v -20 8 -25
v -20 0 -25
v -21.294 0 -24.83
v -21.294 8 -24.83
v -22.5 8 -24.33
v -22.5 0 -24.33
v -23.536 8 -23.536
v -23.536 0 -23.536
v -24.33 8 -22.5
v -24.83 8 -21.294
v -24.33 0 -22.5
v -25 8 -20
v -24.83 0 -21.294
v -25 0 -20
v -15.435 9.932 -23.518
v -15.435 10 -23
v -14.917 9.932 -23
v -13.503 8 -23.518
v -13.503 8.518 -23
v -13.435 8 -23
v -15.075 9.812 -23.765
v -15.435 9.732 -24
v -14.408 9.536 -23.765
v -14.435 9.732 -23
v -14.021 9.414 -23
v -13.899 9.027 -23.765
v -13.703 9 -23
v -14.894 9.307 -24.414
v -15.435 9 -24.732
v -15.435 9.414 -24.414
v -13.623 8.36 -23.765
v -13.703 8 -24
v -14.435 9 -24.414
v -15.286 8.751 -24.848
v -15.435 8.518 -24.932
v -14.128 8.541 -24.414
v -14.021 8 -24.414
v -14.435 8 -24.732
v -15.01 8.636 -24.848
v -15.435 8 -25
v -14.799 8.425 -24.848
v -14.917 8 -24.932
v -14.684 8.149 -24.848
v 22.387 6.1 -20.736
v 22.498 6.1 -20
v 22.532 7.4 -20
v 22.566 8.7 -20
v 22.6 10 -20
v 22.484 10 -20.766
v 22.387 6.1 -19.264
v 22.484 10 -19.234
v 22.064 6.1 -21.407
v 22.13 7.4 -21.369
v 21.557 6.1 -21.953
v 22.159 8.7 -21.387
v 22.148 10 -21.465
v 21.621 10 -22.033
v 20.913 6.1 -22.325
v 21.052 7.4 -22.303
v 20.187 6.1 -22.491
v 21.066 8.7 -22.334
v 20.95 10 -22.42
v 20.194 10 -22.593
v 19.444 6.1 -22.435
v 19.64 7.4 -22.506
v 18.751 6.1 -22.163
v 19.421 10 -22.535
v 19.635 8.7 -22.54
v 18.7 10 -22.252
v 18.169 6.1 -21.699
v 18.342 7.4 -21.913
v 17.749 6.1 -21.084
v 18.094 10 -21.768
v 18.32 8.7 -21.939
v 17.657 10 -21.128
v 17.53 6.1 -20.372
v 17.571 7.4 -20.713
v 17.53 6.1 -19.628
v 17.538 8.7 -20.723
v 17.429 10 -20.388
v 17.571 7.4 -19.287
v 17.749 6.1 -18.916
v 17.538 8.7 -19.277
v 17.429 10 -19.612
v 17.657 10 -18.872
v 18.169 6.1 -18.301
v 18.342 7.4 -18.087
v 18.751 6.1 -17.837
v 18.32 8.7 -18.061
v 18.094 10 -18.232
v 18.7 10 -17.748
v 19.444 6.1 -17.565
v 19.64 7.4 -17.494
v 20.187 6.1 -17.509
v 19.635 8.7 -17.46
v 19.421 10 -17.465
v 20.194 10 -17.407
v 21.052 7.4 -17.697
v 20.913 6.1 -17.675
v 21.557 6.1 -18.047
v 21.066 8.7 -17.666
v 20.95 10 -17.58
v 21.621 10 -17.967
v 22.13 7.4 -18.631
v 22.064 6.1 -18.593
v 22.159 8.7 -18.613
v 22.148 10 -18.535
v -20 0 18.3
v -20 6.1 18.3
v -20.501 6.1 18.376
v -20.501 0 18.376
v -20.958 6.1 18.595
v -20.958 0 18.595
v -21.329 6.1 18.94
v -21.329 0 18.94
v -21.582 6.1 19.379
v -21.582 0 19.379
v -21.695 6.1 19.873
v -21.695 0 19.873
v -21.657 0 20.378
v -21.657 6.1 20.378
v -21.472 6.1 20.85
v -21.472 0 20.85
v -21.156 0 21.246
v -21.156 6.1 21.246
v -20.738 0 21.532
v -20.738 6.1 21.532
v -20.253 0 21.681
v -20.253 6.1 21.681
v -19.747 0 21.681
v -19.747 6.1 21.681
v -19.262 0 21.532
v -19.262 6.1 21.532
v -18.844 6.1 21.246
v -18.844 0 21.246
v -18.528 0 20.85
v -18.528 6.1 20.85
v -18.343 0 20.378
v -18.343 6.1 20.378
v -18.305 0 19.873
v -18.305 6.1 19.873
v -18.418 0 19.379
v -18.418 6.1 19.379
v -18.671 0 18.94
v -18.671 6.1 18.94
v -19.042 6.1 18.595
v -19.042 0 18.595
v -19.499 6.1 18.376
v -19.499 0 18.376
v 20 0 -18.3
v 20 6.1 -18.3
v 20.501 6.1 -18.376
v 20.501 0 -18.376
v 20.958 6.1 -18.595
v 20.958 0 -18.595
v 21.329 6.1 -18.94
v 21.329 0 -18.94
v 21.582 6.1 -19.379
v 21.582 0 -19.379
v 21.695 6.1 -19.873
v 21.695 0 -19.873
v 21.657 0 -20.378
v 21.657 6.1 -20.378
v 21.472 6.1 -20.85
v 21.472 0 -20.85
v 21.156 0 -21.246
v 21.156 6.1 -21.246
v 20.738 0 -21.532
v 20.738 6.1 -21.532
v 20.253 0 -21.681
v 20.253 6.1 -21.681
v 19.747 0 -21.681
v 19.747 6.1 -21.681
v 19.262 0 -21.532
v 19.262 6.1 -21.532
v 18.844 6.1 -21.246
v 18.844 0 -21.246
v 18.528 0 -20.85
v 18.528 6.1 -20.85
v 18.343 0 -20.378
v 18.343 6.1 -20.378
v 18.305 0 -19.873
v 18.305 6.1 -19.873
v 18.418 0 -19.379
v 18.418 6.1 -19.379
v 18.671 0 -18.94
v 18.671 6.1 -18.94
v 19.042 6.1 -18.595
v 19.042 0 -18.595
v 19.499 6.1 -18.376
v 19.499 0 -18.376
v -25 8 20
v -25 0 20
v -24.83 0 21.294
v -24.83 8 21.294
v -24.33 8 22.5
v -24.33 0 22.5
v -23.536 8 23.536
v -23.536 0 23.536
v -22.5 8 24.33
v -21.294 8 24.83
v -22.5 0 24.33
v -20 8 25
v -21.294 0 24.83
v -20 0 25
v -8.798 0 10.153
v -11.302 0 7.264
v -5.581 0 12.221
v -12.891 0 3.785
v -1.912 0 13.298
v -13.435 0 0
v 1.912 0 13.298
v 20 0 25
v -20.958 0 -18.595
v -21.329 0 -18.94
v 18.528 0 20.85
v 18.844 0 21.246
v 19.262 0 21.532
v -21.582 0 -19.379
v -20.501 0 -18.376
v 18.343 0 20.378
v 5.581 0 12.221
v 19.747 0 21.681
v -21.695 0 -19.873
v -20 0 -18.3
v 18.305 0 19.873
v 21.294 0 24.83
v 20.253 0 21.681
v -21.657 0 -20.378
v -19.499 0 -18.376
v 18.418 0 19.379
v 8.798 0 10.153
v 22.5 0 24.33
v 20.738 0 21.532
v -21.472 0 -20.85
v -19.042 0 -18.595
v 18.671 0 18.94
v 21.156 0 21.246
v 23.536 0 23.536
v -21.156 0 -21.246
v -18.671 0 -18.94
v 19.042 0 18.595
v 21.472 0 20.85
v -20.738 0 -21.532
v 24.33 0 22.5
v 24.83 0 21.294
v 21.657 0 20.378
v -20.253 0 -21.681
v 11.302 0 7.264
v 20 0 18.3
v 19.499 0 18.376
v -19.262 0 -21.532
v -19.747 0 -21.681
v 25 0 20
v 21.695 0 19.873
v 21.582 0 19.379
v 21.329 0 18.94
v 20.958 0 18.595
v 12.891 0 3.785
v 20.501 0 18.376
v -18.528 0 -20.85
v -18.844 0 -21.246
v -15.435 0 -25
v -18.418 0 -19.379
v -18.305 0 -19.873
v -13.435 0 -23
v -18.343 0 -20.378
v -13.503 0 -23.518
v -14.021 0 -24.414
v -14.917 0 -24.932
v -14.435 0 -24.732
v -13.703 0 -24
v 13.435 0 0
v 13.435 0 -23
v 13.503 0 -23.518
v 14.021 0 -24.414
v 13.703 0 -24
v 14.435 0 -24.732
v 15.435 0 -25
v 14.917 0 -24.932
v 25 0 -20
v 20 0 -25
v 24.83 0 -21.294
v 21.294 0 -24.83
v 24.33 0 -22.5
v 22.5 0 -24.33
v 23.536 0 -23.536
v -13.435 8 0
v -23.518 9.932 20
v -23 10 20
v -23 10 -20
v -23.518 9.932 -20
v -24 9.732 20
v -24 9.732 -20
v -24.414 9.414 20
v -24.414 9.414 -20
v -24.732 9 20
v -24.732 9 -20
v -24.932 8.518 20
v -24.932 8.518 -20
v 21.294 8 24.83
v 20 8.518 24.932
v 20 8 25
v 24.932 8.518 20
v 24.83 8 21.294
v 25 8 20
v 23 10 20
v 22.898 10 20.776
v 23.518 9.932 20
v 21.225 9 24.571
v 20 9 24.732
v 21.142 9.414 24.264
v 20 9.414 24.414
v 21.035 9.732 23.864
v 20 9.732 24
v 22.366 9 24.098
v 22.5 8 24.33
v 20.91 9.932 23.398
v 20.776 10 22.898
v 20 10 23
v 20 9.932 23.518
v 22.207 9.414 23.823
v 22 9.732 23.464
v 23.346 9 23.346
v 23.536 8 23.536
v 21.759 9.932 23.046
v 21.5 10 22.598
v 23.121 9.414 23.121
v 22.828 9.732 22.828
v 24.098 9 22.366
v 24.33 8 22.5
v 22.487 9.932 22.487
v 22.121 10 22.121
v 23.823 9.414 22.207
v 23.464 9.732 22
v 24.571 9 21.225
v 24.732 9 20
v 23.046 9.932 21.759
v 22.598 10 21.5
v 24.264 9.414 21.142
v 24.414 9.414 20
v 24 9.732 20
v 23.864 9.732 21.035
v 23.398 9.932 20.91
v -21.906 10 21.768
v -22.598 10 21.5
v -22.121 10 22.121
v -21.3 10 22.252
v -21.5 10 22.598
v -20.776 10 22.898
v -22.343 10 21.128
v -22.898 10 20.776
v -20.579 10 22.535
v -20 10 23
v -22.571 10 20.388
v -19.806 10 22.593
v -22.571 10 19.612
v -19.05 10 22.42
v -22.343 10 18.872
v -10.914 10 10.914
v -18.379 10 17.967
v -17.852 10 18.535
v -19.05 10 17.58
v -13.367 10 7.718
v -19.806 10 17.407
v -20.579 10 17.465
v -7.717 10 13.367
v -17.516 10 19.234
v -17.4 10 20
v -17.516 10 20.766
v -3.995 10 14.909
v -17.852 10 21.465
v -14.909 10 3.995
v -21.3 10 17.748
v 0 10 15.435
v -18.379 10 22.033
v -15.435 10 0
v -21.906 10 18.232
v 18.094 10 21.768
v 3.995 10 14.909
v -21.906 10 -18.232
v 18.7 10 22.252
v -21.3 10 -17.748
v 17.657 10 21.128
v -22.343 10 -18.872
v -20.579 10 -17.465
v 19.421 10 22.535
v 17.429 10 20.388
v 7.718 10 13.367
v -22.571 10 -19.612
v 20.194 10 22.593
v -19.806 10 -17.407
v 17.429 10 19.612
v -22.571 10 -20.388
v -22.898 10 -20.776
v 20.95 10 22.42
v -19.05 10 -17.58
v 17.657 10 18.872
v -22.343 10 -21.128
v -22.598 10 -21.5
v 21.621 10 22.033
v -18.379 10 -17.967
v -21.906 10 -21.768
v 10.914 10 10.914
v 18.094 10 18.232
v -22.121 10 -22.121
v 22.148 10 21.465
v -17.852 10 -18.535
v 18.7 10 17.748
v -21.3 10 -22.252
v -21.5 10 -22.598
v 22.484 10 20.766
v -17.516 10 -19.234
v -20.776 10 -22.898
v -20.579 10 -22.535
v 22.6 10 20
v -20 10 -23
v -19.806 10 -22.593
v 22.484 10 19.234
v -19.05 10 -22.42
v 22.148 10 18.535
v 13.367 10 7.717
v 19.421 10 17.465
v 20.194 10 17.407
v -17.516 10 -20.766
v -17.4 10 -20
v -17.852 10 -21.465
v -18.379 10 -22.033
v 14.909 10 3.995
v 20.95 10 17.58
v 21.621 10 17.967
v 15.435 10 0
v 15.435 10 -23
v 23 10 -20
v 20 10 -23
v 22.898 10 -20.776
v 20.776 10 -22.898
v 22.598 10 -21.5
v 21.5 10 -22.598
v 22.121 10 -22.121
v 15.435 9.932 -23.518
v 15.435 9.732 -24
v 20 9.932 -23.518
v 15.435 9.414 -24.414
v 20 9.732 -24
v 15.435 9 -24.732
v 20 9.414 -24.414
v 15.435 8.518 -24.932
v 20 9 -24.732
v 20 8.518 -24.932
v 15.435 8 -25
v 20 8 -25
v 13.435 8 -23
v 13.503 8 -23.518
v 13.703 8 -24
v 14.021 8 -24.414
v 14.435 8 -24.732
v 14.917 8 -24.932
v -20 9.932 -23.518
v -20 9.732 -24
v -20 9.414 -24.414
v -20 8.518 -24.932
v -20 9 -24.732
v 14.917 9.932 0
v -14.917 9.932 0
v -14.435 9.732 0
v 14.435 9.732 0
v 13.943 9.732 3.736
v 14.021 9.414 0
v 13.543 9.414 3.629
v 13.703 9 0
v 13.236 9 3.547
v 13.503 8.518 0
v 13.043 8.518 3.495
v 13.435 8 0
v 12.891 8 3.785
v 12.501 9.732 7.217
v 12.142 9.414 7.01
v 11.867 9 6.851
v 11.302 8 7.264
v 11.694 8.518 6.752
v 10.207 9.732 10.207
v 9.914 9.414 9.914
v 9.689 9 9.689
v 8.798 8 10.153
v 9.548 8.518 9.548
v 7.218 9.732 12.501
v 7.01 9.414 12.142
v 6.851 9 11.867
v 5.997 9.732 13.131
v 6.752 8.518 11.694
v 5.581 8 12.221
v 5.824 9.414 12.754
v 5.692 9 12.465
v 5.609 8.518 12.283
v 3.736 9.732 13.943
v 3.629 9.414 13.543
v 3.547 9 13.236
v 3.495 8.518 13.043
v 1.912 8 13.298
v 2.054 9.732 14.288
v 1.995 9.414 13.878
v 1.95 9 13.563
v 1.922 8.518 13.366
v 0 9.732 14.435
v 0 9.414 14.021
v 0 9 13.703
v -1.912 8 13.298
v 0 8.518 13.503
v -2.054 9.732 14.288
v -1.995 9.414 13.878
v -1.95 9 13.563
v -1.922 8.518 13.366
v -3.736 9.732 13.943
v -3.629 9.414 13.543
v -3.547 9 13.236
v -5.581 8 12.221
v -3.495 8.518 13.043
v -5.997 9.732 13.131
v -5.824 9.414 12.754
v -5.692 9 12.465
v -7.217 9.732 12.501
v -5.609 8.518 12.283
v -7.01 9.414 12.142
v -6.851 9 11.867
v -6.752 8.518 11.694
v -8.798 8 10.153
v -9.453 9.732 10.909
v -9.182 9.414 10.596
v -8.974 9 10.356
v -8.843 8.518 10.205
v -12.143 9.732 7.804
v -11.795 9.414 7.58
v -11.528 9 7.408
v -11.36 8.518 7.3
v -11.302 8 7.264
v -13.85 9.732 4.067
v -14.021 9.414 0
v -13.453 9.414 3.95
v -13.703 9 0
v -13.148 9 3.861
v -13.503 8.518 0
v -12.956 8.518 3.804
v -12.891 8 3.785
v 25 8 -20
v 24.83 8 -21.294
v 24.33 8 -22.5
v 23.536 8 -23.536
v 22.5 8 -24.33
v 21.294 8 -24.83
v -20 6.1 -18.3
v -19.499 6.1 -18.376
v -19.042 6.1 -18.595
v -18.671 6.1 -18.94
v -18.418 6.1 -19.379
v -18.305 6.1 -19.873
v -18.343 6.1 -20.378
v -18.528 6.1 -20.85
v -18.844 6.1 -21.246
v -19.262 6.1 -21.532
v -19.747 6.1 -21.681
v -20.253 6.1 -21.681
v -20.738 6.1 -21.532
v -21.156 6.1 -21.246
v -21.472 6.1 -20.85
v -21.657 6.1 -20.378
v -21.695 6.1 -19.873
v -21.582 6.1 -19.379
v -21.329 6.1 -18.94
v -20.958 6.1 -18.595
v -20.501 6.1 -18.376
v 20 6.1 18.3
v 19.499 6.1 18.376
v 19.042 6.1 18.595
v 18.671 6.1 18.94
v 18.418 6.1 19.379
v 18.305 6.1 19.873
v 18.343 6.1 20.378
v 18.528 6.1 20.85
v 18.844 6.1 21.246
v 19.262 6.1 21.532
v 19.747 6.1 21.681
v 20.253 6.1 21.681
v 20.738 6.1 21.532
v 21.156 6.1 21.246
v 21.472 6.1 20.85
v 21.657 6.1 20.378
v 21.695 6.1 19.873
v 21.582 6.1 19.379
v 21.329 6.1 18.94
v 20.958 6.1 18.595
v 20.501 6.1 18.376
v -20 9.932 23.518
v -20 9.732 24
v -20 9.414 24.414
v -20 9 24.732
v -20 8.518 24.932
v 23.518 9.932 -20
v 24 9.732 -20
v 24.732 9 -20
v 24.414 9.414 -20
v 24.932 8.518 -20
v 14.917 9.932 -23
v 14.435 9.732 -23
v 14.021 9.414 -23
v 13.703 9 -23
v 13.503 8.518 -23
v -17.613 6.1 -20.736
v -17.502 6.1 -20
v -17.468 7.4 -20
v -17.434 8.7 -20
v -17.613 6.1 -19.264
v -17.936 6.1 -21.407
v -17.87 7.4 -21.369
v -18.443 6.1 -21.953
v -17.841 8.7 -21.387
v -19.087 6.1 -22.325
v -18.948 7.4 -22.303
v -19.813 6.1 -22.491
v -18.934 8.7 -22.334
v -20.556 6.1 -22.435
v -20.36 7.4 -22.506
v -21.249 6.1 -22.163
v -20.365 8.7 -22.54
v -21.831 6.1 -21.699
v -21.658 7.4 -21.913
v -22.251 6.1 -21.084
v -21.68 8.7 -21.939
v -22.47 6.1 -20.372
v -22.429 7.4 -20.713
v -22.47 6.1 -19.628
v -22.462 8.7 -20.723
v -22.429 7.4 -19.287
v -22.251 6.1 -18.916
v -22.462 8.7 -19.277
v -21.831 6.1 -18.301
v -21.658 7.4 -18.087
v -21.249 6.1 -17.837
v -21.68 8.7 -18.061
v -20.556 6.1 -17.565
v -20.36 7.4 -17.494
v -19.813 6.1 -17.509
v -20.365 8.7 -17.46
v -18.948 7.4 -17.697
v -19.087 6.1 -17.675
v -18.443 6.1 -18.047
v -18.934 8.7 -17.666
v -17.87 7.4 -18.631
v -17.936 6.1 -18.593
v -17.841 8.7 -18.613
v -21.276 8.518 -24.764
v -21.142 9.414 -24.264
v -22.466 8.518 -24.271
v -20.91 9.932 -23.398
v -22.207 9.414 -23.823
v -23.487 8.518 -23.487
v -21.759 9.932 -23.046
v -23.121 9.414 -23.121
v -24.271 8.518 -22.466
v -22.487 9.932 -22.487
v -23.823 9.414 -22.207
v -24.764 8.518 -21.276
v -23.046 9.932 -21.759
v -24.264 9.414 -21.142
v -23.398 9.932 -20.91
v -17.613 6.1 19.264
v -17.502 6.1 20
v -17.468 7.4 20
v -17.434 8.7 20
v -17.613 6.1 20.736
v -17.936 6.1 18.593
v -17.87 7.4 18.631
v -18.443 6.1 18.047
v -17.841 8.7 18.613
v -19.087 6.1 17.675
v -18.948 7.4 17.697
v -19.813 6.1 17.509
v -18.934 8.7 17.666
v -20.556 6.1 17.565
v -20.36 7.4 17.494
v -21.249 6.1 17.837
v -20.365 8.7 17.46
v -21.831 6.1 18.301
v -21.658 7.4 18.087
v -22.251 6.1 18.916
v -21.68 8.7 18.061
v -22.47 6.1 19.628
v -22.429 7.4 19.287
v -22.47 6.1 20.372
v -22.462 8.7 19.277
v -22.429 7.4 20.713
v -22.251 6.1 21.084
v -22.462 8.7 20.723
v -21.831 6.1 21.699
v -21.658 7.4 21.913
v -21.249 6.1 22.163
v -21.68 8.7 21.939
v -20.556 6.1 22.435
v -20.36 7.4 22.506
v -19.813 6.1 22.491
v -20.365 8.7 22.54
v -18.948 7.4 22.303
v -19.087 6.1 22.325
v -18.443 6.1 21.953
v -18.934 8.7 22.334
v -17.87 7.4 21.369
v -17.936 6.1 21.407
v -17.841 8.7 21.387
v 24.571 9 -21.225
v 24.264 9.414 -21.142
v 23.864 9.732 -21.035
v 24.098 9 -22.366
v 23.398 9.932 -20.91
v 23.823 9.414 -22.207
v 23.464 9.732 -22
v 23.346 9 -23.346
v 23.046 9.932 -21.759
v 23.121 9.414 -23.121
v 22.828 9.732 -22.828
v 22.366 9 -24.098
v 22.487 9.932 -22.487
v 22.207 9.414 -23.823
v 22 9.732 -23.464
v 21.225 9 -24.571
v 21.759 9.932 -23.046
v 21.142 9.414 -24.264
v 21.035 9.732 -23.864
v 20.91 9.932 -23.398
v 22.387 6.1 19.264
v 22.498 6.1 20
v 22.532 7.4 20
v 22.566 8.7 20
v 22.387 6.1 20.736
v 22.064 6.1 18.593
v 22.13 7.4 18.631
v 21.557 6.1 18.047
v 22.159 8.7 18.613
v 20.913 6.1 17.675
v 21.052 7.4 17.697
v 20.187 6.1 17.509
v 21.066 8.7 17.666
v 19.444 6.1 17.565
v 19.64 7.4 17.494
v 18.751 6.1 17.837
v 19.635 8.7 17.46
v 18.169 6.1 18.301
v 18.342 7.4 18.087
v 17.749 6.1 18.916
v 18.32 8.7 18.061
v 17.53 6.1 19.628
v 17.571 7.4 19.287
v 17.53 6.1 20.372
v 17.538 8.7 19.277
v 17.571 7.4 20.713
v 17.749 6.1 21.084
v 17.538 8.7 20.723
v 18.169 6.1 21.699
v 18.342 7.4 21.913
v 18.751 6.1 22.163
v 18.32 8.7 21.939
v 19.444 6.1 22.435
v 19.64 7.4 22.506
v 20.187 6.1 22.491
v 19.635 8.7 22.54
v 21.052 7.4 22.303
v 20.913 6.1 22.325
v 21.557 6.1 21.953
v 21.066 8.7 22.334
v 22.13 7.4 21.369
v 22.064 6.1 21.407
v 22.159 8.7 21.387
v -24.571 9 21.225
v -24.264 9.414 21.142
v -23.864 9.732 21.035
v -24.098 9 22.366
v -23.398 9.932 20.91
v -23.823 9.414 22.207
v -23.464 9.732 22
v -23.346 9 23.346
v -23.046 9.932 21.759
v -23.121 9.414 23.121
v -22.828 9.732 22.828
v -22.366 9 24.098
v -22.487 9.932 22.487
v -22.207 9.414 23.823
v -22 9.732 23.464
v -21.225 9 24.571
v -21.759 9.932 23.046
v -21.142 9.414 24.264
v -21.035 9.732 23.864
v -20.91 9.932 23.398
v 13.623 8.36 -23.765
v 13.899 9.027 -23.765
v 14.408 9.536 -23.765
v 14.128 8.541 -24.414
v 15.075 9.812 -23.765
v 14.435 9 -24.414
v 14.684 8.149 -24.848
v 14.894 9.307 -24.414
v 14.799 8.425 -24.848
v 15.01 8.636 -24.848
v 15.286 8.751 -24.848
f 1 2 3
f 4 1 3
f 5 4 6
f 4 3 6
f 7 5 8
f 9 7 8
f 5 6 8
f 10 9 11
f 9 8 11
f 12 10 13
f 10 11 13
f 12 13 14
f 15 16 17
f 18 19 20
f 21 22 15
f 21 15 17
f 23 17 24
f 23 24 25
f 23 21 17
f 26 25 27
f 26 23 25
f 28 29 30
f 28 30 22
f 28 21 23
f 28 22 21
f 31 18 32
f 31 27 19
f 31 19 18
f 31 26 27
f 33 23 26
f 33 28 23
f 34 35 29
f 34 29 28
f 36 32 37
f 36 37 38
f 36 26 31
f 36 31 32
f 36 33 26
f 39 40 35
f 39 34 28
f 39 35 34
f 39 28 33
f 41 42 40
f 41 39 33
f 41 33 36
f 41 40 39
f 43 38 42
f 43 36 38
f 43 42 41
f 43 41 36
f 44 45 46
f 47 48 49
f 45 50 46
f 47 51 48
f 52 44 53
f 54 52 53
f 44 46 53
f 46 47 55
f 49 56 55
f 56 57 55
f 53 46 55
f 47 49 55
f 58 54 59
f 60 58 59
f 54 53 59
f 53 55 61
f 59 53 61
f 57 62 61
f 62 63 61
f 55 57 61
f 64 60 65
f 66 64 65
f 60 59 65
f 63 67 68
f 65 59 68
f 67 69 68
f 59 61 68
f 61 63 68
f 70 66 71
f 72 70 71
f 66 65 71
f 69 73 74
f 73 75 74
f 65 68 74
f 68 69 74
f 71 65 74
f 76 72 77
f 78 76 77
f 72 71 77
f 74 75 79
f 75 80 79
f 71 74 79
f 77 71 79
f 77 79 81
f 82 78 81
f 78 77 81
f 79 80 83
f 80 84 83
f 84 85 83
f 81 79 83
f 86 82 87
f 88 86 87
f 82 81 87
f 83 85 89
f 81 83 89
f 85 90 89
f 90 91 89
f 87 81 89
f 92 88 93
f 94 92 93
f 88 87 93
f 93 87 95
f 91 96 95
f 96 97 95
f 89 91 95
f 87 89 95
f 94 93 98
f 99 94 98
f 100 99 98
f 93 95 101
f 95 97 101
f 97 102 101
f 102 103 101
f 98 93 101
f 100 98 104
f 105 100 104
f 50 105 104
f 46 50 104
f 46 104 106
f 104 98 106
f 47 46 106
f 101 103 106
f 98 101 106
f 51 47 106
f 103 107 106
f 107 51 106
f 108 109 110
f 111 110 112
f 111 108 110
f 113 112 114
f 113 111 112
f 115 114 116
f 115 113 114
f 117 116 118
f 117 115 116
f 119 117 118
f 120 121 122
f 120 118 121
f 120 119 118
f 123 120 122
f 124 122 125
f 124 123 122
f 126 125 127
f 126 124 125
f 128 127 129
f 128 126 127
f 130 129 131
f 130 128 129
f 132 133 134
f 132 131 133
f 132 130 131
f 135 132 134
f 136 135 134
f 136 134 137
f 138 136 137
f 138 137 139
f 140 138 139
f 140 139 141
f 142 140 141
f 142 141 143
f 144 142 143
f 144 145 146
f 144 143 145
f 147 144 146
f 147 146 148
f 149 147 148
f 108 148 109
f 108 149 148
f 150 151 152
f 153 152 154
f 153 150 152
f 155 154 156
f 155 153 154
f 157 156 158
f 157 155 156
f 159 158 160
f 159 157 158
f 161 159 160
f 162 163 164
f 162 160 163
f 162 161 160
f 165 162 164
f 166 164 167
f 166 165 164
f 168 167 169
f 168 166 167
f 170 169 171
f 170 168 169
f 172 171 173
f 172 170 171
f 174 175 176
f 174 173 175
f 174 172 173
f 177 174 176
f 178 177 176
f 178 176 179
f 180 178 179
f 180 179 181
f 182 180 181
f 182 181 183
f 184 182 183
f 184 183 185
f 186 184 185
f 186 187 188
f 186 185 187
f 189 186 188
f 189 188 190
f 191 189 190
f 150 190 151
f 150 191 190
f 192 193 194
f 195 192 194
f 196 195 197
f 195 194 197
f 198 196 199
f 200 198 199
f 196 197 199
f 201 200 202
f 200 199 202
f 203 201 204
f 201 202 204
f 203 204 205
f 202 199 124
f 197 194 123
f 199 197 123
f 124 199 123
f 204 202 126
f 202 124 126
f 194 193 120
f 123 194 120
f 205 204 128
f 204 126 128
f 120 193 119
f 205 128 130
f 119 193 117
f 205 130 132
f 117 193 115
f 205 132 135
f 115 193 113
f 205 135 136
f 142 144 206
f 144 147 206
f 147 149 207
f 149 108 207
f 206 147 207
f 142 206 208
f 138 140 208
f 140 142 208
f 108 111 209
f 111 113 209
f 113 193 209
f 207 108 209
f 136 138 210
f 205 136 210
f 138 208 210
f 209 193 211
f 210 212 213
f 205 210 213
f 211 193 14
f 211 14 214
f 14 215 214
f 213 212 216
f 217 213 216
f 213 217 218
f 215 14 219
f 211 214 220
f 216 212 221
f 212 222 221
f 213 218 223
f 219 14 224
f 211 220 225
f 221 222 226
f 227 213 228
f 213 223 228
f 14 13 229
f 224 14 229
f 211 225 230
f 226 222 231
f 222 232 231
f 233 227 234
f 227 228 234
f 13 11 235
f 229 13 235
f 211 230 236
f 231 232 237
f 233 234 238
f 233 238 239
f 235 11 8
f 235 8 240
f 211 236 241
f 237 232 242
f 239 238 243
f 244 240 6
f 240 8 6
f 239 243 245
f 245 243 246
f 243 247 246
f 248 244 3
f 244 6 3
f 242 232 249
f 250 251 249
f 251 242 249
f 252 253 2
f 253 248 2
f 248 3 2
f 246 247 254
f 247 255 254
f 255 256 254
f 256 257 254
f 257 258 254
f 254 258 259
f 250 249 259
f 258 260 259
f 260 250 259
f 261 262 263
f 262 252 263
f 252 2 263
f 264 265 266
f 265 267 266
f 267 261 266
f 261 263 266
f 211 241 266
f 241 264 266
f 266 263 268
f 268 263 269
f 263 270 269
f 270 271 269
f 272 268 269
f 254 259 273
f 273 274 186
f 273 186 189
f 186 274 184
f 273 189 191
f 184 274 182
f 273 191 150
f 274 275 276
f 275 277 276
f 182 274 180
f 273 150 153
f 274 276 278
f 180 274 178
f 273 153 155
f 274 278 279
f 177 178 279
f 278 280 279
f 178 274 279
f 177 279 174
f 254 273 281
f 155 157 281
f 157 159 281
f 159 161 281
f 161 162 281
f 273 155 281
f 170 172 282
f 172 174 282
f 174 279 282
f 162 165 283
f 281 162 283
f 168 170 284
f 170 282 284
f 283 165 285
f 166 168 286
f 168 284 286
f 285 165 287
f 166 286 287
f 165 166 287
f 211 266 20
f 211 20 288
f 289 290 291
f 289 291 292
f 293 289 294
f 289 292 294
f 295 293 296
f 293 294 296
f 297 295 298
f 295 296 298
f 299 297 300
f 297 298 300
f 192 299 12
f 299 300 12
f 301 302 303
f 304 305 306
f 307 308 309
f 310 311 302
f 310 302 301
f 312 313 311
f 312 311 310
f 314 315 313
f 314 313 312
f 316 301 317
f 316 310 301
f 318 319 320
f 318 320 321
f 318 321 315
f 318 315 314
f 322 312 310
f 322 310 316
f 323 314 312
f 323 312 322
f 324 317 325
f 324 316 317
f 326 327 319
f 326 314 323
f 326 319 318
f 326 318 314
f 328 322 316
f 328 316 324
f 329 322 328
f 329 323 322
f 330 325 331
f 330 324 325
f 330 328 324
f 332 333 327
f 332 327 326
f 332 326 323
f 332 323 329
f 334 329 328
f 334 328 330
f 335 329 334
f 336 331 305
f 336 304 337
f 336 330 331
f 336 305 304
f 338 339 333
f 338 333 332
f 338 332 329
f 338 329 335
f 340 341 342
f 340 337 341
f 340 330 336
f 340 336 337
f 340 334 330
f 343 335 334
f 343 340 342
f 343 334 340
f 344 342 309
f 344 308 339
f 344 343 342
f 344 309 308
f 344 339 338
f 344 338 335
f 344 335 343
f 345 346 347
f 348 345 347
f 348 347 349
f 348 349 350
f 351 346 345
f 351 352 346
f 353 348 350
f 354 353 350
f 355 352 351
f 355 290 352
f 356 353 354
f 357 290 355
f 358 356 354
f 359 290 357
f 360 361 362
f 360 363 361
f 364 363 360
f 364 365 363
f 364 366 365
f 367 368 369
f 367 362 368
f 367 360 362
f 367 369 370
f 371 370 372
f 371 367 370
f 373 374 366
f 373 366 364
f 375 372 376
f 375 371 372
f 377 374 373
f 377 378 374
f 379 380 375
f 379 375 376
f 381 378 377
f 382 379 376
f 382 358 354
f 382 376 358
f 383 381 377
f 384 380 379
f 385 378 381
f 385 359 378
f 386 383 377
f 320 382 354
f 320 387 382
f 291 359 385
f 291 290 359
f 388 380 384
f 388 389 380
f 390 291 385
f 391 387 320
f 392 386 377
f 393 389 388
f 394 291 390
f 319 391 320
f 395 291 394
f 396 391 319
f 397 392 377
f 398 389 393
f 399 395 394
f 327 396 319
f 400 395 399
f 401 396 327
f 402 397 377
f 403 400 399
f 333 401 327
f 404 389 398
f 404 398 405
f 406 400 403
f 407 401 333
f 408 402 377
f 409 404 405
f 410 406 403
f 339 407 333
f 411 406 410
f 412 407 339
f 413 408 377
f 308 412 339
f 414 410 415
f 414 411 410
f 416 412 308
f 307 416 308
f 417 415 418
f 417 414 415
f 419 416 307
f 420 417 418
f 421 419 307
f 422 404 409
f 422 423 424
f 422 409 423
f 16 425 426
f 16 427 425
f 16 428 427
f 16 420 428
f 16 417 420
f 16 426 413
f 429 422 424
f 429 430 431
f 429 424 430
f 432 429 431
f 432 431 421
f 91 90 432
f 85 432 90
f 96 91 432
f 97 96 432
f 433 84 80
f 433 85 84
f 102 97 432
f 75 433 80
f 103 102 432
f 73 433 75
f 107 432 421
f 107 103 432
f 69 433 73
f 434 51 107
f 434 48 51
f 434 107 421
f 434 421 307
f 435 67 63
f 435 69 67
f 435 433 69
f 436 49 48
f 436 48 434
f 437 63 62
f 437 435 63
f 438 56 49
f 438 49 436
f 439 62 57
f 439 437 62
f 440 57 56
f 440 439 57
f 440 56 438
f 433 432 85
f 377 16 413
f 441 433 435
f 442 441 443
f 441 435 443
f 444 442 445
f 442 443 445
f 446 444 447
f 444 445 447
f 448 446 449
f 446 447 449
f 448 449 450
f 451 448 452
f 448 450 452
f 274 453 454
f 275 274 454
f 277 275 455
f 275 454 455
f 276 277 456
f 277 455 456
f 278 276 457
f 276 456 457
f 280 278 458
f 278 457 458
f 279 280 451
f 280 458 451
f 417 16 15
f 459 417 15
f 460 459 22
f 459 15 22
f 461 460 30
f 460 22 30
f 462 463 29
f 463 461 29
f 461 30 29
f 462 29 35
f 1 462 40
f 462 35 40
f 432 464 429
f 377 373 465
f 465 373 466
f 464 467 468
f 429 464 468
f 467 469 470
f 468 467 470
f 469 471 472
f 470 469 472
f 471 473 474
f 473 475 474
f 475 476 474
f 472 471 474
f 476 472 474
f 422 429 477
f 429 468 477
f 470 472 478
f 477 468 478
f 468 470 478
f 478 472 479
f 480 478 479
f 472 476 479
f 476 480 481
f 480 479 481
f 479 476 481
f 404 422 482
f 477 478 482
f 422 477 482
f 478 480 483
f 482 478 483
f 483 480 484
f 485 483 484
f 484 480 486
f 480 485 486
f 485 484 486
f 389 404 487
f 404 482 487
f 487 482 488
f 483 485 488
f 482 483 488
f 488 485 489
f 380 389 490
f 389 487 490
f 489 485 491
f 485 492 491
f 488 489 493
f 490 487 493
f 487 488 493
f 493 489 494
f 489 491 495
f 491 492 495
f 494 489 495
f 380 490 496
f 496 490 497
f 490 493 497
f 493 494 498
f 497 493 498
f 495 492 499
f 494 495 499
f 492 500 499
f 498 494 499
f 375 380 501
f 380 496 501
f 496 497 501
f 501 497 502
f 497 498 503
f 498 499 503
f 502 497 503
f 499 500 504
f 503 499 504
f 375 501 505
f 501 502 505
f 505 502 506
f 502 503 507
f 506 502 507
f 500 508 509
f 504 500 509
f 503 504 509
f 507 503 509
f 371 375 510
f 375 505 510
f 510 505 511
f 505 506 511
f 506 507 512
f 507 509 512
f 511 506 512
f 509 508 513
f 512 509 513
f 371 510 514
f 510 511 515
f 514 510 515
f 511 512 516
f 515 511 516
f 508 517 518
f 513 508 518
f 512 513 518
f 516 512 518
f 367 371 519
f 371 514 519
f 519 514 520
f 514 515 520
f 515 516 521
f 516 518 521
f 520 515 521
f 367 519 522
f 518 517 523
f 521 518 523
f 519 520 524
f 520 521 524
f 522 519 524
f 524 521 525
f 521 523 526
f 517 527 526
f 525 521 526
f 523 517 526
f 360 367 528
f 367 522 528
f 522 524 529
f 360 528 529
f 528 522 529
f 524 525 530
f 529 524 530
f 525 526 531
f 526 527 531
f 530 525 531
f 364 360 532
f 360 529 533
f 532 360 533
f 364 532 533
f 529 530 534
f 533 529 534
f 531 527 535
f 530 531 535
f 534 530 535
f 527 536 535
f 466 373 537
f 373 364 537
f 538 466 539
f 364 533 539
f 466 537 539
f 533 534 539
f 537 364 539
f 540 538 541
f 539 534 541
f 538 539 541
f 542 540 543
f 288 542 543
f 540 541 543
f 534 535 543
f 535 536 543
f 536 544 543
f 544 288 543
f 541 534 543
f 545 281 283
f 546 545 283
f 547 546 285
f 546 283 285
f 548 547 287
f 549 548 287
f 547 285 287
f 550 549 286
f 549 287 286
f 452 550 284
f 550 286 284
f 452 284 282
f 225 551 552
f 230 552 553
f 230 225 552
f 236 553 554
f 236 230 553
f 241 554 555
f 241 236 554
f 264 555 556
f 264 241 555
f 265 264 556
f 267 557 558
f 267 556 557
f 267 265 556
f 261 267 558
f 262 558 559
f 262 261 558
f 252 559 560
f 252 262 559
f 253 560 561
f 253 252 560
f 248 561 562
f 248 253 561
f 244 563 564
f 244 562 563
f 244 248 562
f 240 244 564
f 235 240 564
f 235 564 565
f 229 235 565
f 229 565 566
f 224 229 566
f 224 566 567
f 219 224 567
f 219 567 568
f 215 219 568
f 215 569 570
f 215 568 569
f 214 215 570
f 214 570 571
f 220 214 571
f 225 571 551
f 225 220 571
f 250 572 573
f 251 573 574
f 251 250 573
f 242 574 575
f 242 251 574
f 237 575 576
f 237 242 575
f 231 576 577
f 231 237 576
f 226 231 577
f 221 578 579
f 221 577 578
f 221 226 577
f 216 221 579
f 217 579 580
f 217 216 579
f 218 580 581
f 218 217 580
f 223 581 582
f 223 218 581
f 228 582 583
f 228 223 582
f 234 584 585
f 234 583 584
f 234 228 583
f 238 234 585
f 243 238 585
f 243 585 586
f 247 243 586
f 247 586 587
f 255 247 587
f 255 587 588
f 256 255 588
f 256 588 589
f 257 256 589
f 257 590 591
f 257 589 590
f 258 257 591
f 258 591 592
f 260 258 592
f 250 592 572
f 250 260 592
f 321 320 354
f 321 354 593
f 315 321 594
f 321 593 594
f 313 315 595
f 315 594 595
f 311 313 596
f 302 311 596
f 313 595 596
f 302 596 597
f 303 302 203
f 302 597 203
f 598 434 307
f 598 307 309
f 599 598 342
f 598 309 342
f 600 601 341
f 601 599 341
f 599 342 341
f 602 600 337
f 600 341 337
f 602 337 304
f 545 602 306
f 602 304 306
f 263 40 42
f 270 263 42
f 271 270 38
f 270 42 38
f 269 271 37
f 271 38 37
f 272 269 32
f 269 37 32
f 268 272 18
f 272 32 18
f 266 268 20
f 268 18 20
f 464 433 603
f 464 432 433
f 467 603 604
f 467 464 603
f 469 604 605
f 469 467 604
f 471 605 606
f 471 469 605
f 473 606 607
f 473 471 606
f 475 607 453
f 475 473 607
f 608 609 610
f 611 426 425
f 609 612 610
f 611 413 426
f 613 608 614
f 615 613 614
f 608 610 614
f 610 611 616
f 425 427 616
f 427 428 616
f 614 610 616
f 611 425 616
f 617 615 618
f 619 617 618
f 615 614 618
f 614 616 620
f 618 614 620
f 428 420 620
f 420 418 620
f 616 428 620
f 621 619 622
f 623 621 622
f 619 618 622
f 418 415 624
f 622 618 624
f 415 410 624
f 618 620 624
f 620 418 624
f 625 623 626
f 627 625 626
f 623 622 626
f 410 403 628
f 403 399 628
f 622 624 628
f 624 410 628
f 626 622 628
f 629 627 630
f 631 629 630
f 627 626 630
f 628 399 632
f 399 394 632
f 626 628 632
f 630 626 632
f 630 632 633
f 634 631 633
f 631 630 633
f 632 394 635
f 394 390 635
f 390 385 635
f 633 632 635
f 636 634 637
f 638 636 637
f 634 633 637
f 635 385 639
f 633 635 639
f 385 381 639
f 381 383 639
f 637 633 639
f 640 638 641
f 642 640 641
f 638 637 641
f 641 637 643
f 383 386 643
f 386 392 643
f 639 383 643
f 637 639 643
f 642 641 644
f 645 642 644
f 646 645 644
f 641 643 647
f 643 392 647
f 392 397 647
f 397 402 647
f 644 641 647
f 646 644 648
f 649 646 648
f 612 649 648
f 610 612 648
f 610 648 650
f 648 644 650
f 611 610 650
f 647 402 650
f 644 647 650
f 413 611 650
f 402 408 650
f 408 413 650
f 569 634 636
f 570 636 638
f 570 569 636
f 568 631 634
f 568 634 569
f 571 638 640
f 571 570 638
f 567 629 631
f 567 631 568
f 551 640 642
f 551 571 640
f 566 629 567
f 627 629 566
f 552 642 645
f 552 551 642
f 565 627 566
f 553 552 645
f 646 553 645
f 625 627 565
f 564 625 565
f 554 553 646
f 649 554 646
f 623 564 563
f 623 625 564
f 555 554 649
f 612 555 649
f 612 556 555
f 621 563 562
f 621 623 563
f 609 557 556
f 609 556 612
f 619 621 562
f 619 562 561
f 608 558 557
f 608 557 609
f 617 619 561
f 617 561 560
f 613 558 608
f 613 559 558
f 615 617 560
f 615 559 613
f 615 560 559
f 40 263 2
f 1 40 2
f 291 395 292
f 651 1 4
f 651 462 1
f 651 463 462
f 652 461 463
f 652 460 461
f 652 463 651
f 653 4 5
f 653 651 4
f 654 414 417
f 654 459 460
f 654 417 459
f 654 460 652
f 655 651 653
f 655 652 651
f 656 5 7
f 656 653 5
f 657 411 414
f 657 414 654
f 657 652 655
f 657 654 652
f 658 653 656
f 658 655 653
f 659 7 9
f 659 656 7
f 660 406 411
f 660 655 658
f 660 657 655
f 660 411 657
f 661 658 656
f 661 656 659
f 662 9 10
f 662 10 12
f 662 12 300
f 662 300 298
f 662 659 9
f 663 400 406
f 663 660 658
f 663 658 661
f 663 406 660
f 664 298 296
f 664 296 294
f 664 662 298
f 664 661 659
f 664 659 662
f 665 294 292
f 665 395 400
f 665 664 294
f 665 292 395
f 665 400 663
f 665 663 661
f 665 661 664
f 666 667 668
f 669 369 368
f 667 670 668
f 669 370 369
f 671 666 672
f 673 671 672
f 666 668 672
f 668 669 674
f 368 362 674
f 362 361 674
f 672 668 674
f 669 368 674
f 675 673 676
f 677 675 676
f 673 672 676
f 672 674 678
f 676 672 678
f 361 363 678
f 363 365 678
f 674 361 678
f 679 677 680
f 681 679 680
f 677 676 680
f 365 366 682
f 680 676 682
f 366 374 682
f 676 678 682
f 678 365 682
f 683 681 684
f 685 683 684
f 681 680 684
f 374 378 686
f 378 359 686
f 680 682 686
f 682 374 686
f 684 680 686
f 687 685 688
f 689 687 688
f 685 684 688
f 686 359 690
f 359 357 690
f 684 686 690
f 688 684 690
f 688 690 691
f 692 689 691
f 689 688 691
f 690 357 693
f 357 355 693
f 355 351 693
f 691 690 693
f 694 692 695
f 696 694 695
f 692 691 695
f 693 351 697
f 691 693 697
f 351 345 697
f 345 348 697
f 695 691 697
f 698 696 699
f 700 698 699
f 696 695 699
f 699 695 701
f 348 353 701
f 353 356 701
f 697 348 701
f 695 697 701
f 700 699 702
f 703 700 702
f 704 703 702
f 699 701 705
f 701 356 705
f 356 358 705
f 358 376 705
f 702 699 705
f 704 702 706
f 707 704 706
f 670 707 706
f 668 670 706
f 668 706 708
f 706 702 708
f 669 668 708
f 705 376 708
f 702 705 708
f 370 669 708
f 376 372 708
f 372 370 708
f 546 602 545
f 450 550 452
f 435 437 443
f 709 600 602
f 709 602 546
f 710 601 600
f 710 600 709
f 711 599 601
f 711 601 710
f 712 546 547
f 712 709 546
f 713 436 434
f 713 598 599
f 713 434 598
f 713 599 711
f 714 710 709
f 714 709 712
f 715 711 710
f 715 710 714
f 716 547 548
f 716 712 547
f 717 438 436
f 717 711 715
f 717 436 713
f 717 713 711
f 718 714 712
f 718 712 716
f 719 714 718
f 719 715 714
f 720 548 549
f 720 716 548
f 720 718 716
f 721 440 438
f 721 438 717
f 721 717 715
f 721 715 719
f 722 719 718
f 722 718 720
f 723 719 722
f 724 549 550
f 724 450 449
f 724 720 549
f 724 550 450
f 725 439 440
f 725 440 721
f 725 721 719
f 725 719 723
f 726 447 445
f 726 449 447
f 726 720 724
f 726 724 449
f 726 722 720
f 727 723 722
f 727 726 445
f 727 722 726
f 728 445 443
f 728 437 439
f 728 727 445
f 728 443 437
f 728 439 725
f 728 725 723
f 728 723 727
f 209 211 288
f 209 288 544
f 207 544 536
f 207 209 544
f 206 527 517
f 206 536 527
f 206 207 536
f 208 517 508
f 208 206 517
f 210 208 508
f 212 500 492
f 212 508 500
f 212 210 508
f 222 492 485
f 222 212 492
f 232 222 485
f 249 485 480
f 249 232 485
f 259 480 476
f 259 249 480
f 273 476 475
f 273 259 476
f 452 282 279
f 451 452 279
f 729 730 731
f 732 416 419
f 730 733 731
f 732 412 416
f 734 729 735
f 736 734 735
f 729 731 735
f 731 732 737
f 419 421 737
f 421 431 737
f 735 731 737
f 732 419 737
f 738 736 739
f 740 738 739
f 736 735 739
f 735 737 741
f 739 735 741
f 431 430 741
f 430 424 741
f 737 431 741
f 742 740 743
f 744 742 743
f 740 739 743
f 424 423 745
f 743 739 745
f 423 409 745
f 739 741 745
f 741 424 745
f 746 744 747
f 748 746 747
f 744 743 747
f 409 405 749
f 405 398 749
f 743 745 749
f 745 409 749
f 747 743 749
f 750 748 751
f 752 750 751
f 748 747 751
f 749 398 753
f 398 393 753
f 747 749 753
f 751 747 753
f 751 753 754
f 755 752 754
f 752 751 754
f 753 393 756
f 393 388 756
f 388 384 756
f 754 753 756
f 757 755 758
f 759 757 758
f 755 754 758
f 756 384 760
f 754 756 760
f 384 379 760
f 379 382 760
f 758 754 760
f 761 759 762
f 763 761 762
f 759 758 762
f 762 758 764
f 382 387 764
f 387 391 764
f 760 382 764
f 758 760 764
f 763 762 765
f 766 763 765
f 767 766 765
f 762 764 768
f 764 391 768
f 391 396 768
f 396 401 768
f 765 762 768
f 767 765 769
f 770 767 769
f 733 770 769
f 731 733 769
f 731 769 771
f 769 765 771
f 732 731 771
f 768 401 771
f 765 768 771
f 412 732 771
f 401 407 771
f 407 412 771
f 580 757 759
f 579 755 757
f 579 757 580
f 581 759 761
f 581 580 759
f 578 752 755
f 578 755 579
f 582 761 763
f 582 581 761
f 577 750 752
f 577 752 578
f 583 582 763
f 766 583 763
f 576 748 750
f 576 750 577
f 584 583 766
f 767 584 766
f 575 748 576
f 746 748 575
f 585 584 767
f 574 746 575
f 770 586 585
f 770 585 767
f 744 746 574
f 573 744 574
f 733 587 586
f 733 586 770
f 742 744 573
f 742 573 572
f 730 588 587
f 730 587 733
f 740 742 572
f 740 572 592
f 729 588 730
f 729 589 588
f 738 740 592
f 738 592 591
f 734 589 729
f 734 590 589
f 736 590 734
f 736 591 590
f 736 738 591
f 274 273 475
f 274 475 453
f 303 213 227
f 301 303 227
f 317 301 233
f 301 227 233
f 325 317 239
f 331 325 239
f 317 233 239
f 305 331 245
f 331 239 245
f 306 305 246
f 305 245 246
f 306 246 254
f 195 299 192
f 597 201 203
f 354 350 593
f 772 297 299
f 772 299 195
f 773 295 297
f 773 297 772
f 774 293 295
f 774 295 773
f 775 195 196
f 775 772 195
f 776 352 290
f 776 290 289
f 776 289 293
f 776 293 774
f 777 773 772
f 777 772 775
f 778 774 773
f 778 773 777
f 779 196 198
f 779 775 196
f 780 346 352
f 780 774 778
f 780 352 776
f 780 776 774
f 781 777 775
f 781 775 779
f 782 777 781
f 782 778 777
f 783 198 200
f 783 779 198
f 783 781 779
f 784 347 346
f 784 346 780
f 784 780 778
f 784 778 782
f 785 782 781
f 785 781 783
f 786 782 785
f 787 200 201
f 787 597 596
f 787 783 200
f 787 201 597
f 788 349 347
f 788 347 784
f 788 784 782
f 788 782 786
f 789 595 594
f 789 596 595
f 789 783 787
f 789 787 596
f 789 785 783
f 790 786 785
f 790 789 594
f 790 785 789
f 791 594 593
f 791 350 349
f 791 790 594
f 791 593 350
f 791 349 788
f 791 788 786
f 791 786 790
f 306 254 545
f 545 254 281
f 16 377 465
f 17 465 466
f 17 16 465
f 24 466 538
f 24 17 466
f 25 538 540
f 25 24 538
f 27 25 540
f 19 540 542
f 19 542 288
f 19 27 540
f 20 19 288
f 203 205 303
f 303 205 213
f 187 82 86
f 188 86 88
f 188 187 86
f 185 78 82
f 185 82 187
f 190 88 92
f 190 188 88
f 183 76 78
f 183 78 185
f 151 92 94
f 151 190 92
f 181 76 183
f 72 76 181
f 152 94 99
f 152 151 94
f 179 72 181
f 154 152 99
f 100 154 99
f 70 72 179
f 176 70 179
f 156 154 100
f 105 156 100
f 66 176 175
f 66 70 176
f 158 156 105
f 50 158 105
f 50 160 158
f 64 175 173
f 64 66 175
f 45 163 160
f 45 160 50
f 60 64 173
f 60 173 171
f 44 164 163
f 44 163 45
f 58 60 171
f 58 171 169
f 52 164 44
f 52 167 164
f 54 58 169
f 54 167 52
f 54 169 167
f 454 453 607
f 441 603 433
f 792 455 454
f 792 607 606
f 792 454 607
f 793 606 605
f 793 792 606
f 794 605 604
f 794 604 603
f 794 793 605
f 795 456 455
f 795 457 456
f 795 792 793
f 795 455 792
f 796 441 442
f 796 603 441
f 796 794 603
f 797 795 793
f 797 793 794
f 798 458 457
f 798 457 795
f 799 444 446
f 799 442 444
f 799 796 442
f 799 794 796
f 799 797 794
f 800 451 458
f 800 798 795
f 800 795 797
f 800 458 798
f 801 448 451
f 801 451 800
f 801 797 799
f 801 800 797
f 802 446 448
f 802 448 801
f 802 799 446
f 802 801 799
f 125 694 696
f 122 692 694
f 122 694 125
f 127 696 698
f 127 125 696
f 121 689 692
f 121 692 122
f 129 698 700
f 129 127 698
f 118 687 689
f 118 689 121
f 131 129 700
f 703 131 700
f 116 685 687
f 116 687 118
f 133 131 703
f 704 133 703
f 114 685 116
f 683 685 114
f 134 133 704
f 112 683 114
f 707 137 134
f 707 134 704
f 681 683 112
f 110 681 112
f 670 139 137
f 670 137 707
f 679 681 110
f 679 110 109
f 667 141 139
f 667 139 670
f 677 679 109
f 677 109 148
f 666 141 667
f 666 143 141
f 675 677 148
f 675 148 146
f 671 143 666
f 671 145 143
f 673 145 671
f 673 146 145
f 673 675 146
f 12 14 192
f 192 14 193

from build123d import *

# Parameters (mm, degrees)
BOSS_EXTRUDE1_DEPTH          = 10
SKETCH1_4_R                  = 1.7
CUT_EXTRUDE1_DEPTH           = 37.742346142
CUT_EXTRUDE2_START           = 10
SKETCH1_5_R                  = 2.6
CUT_EXTRUDE2_DEPTH           = 3.9
CUT_EXTRUDE2_DRAFT           = -1.5
CUT_EXTRUDE2_PROFILE_2_DEPTH = 3.9
CUT_EXTRUDE2_PROFILE_2_DRAFT = -1.5
CUT_EXTRUDE2_PROFILE_3_DEPTH = 3.9
CUT_EXTRUDE2_PROFILE_3_DRAFT = -1.5
CUT_EXTRUDE2_PROFILE_4_DEPTH = 3.9
CUT_EXTRUDE2_PROFILE_4_DRAFT = -1.5
FILLET1_R                    = 2
FILLET2_R                    = 2


with BuildPart() as part:
    # Sketch1 → Boss-Extrude1 (new body)
    with BuildSketch(Plane(origin=(0, 0, 0), x_dir=(1, 0, 0), z_dir=(0, 1, 0))):
        with BuildLine():
            Line((-20, -25), (20, -25))
            ThreePointArc((20, -25), (23.535533906, -23.535533906), (25, -20))
            Line((25, -20), (25, 20))
            ThreePointArc((25, 20), (23.535533906, 23.535533906), (20, 25))
            Line((20, 25), (-20, 25))
            ThreePointArc((-20, 25), (-23.535533906, 23.535533906), (-25, 20))
            Line((-25, 20), (-25, -20))
            ThreePointArc((-25, -20), (-23.535533906, -23.535533906), (-20, -25))
        make_face()
    extrude(amount=BOSS_EXTRUDE1_DEPTH)

    # Sketch1<4> → Cut-Extrude1 (cut, through all)
    with BuildSketch(Plane(origin=(0, 0, 0), x_dir=(1, 0, 0), z_dir=(0, 1, 0))):
        with BuildLine():
            Line((13.435, 25), (-13.435, 25))
            Line((-13.435, 25), (-13.435, 0))
            ThreePointArc((-13.435, 0), (0, -13.435), (13.435, 0))
            Line((13.435, 0), (13.435, 25))
        make_face()
        with Locations(Location((-20, 20, 0), (0, 0, 270))):
            Circle(SKETCH1_4_R)
        with Locations(Location((-20, -20, 0), (0, 0, 90))):
            Circle(SKETCH1_4_R)
        with Locations(Location((20, -20, 0), (0, 0, 90))):
            Circle(SKETCH1_4_R)
        with Locations(Location((20, 20, 0), (0, 0, 270))):
            Circle(SKETCH1_4_R)
    extrude(amount=CUT_EXTRUDE1_DEPTH, mode=Mode.SUBTRACT)


with BuildPart() as cut_extrude2_tool:
    # Sketch1<5> → Cut-Extrude2 (with draft: the straight prism first)
    with BuildSketch(Plane(origin=(0, 0, 0), x_dir=(1, 0, 0), z_dir=(0, 1, 0)).offset(CUT_EXTRUDE2_START)):
        with Locations((-20, 20)):
            Circle(SKETCH1_5_R)
    extrude(amount=-CUT_EXTRUDE2_DEPTH)
    # Cut-Extrude2: the draft: its side faces are tilted about the plane it starts from
    cut_extrude2_sides = [cut_extrude2_tool.faces().sort_by_distance(p)[0] for p in [
        (-22.6, 8.05, -20),
    ]]
    draft(cut_extrude2_sides, Plane(origin=(0, 0, 0), x_dir=(1, 0, 0), z_dir=(0, 1, 0)).offset(CUT_EXTRUDE2_START), CUT_EXTRUDE2_DRAFT)


with BuildPart() as part_1:
    add(part.part)

    # Cut-Extrude2: cut by cut_extrude2_tool
    add(cut_extrude2_tool.part, mode=Mode.SUBTRACT)


with BuildPart() as cut_extrude2_profile_2_tool:
    # Sketch1<5> → Cut-Extrude2 profile 2 (with draft: the straight prism first)
    with BuildSketch(Plane(origin=(0, 0, 0), x_dir=(1, 0, 0), z_dir=(0, 1, 0)).offset(CUT_EXTRUDE2_START)):
        with Locations((20, 20)):
            Circle(SKETCH1_5_R)
    extrude(amount=-CUT_EXTRUDE2_PROFILE_2_DEPTH)
    # Cut-Extrude2 profile 2: the draft: its side faces are tilted about the plane it starts from
    cut_extrude2_profile_2_sides = [cut_extrude2_profile_2_tool.faces().sort_by_distance(p)[0] for p in [
        (17.4, 8.05, -20),
    ]]
    draft(cut_extrude2_profile_2_sides, Plane(origin=(0, 0, 0), x_dir=(1, 0, 0), z_dir=(0, 1, 0)).offset(CUT_EXTRUDE2_START), CUT_EXTRUDE2_PROFILE_2_DRAFT)


with BuildPart() as part_2:
    add(part_1.part)

    # Cut-Extrude2 profile 2: cut by cut_extrude2_profile_2_tool
    add(cut_extrude2_profile_2_tool.part, mode=Mode.SUBTRACT)


with BuildPart() as cut_extrude2_profile_3_tool:
    # Sketch1<5> → Cut-Extrude2 profile 3 (with draft: the straight prism first)
    with BuildSketch(Plane(origin=(0, 0, 0), x_dir=(1, 0, 0), z_dir=(0, 1, 0)).offset(CUT_EXTRUDE2_START)):
        with Locations((-20, -20)):
            Circle(SKETCH1_5_R)
    extrude(amount=-CUT_EXTRUDE2_PROFILE_3_DEPTH)
    # Cut-Extrude2 profile 3: the draft: its side faces are tilted about the plane it starts from
    cut_extrude2_profile_3_sides = [cut_extrude2_profile_3_tool.faces().sort_by_distance(p)[0] for p in [
        (-22.6, 8.05, 20),
    ]]
    draft(cut_extrude2_profile_3_sides, Plane(origin=(0, 0, 0), x_dir=(1, 0, 0), z_dir=(0, 1, 0)).offset(CUT_EXTRUDE2_START), CUT_EXTRUDE2_PROFILE_3_DRAFT)


with BuildPart() as part_3:
    add(part_2.part)

    # Cut-Extrude2 profile 3: cut by cut_extrude2_profile_3_tool
    add(cut_extrude2_profile_3_tool.part, mode=Mode.SUBTRACT)


with BuildPart() as cut_extrude2_profile_4_tool:
    # Sketch1<5> → Cut-Extrude2 profile 4 (with draft: the straight prism first)
    with BuildSketch(Plane(origin=(0, 0, 0), x_dir=(1, 0, 0), z_dir=(0, 1, 0)).offset(CUT_EXTRUDE2_START)):
        with Locations((20, -20)):
            Circle(SKETCH1_5_R)
    extrude(amount=-CUT_EXTRUDE2_PROFILE_4_DEPTH)
    # Cut-Extrude2 profile 4: the draft: its side faces are tilted about the plane it starts from
    cut_extrude2_profile_4_sides = [cut_extrude2_profile_4_tool.faces().sort_by_distance(p)[0] for p in [
        (17.4, 8.05, 20),
    ]]
    draft(cut_extrude2_profile_4_sides, Plane(origin=(0, 0, 0), x_dir=(1, 0, 0), z_dir=(0, 1, 0)).offset(CUT_EXTRUDE2_START), CUT_EXTRUDE2_PROFILE_4_DRAFT)


with BuildPart() as part_4:
    add(part_3.part)

    # Cut-Extrude2 profile 4: cut by cut_extrude2_profile_4_tool
    add(cut_extrude2_profile_4_tool.part, mode=Mode.SUBTRACT)

    # Fillet1
    fillet1_edges = [part_4.edges().sort_by_distance(p)[0] for p in [
        (-13.435, 10, -12.5),
        (-13.435, 5, -25),
        (13.435, 5, -25),
        (0, 10, 13.435),
        (13.435, 10, -12.5),
    ]]
    fillet(fillet1_edges, radius=FILLET1_R)

    # Fillet2
    # the kernel refuses this fillet: 2 mm, written as the material it takes off along each edge
    with BuildSketch(Plane(origin=(15.435, 8, -23), x_dir=(0, 1, 0), z_dir=(0, 0, -1))) as fillet2_piece_1_section:
        Polygon((0, 0), (FILLET2_R, 0), (FILLET2_R, -FILLET2_R), (0, -FILLET2_R), align=None)
    fillet2_piece_1 = extrude(amount=FILLET2_R, mode=Mode.PRIVATE)
    fillet2_piece_1 = fillet2_piece_1 - Plane(origin=(15.435, 8, -23), x_dir=(0.7071067811865475, -0.7071067811865475, 0), z_dir=(0, 0, -1)) * Sphere(FILLET2_R, mode=Mode.PRIVATE)
    add(fillet2_piece_1, mode=Mode.SUBTRACT)
    with BuildSketch(Plane(origin=(-15.435, 8, -23), x_dir=(0, 1, 0), z_dir=(0, 0, -1))) as fillet2_piece_2_section:
        Polygon((0, 0), (FILLET2_R, 0), (FILLET2_R, FILLET2_R), (0, FILLET2_R), align=None)
    fillet2_piece_2 = extrude(amount=FILLET2_R, mode=Mode.PRIVATE)
    fillet2_piece_2 = fillet2_piece_2 - Plane(origin=(-15.435, 8, -23), x_dir=(-0.7071067811865475, -0.7071067811865475, 0), z_dir=(0, 0, -1)) * Sphere(FILLET2_R, mode=Mode.PRIVATE)
    add(fillet2_piece_2, mode=Mode.SUBTRACT)
    with BuildSketch(Plane(origin=(-20, 10, -20), x_dir=(0, 0, -1), z_dir=(1, 0, 0))) as fillet2_piece_3:
        with BuildLine():
            CenterArc((5 - FILLET2_R, -FILLET2_R), FILLET2_R, 0, 90)
            Line((5 - FILLET2_R, 0), (5, 0))
            Line((5, 0), (5, -FILLET2_R))
        make_face()
    revolve(axis=Axis((-20, 10, -20), (0, 1, 0)), revolution_arc=90, mode=Mode.SUBTRACT)
    with BuildSketch(Plane(origin=(-15.435, 10, -25), x_dir=(0, -1, 0), z_dir=(-1, 0, 0)), Plane(origin=(20, 10, -25), x_dir=(0, -1, 0), z_dir=(-1, 0, 0))) as fillet2_piece_4:
        with BuildLine():
            CenterArc((FILLET2_R, FILLET2_R), FILLET2_R, 180, 90)
            Line((0, FILLET2_R), (0, 0))
            Line((0, 0), (FILLET2_R, 0))
        make_face()
    extrude(amount=4.565, mode=Mode.SUBTRACT)
    with BuildSketch(Plane(origin=(20, 10, -20), x_dir=(1, 0, 0), z_dir=(0, 0, 1))) as fillet2_piece_5:
        with BuildLine():
            CenterArc((5 - FILLET2_R, -FILLET2_R), FILLET2_R, 0, 90)
            Line((5 - FILLET2_R, 0), (5, 0))
            Line((5, 0), (5, -FILLET2_R))
        make_face()
    revolve(axis=Axis((20, 10, -20), (0, 1, 0)), revolution_arc=90, mode=Mode.SUBTRACT)
    with BuildSketch(Plane(origin=(25, 10, 20), x_dir=(0, -1, 0), z_dir=(0, 0, -1)), Plane(origin=(-20, 10, 25), x_dir=(0, -1, 0), z_dir=(1, 0, 0)), Plane(origin=(-25, 10, -20), x_dir=(0, -1, 0), z_dir=(0, 0, 1))) as fillet2_piece_6:
        with BuildLine():
            CenterArc((FILLET2_R, FILLET2_R), FILLET2_R, 180, 90)
            Line((0, FILLET2_R), (0, 0))
            Line((0, 0), (FILLET2_R, 0))
        make_face()
    extrude(amount=40, mode=Mode.SUBTRACT)
    with BuildSketch(Plane(origin=(20, 10, 20), x_dir=(0, 0, 1), z_dir=(-1, 0, 0))) as fillet2_piece_7:
        with BuildLine():
            CenterArc((5 - FILLET2_R, -FILLET2_R), FILLET2_R, 0, 90)
            Line((5 - FILLET2_R, 0), (5, 0))
            Line((5, 0), (5, -FILLET2_R))
        make_face()
    revolve(axis=Axis((20, 10, 20), (0, 1, 0)), revolution_arc=90, mode=Mode.SUBTRACT)
    with BuildSketch(Plane(origin=(-20, 10, 20), x_dir=(-1, 0, 0), z_dir=(0, 0, -1))) as fillet2_piece_8:
        with BuildLine():
            CenterArc((5 - FILLET2_R, -FILLET2_R), FILLET2_R, 0, 90)
            Line((5 - FILLET2_R, 0), (5, 0))
            Line((5, 0), (5, -FILLET2_R))
        make_face()
    revolve(axis=Axis((-20, 10, 20), (0, 1, 0)), revolution_arc=90, mode=Mode.SUBTRACT)


solid = part_4.part
